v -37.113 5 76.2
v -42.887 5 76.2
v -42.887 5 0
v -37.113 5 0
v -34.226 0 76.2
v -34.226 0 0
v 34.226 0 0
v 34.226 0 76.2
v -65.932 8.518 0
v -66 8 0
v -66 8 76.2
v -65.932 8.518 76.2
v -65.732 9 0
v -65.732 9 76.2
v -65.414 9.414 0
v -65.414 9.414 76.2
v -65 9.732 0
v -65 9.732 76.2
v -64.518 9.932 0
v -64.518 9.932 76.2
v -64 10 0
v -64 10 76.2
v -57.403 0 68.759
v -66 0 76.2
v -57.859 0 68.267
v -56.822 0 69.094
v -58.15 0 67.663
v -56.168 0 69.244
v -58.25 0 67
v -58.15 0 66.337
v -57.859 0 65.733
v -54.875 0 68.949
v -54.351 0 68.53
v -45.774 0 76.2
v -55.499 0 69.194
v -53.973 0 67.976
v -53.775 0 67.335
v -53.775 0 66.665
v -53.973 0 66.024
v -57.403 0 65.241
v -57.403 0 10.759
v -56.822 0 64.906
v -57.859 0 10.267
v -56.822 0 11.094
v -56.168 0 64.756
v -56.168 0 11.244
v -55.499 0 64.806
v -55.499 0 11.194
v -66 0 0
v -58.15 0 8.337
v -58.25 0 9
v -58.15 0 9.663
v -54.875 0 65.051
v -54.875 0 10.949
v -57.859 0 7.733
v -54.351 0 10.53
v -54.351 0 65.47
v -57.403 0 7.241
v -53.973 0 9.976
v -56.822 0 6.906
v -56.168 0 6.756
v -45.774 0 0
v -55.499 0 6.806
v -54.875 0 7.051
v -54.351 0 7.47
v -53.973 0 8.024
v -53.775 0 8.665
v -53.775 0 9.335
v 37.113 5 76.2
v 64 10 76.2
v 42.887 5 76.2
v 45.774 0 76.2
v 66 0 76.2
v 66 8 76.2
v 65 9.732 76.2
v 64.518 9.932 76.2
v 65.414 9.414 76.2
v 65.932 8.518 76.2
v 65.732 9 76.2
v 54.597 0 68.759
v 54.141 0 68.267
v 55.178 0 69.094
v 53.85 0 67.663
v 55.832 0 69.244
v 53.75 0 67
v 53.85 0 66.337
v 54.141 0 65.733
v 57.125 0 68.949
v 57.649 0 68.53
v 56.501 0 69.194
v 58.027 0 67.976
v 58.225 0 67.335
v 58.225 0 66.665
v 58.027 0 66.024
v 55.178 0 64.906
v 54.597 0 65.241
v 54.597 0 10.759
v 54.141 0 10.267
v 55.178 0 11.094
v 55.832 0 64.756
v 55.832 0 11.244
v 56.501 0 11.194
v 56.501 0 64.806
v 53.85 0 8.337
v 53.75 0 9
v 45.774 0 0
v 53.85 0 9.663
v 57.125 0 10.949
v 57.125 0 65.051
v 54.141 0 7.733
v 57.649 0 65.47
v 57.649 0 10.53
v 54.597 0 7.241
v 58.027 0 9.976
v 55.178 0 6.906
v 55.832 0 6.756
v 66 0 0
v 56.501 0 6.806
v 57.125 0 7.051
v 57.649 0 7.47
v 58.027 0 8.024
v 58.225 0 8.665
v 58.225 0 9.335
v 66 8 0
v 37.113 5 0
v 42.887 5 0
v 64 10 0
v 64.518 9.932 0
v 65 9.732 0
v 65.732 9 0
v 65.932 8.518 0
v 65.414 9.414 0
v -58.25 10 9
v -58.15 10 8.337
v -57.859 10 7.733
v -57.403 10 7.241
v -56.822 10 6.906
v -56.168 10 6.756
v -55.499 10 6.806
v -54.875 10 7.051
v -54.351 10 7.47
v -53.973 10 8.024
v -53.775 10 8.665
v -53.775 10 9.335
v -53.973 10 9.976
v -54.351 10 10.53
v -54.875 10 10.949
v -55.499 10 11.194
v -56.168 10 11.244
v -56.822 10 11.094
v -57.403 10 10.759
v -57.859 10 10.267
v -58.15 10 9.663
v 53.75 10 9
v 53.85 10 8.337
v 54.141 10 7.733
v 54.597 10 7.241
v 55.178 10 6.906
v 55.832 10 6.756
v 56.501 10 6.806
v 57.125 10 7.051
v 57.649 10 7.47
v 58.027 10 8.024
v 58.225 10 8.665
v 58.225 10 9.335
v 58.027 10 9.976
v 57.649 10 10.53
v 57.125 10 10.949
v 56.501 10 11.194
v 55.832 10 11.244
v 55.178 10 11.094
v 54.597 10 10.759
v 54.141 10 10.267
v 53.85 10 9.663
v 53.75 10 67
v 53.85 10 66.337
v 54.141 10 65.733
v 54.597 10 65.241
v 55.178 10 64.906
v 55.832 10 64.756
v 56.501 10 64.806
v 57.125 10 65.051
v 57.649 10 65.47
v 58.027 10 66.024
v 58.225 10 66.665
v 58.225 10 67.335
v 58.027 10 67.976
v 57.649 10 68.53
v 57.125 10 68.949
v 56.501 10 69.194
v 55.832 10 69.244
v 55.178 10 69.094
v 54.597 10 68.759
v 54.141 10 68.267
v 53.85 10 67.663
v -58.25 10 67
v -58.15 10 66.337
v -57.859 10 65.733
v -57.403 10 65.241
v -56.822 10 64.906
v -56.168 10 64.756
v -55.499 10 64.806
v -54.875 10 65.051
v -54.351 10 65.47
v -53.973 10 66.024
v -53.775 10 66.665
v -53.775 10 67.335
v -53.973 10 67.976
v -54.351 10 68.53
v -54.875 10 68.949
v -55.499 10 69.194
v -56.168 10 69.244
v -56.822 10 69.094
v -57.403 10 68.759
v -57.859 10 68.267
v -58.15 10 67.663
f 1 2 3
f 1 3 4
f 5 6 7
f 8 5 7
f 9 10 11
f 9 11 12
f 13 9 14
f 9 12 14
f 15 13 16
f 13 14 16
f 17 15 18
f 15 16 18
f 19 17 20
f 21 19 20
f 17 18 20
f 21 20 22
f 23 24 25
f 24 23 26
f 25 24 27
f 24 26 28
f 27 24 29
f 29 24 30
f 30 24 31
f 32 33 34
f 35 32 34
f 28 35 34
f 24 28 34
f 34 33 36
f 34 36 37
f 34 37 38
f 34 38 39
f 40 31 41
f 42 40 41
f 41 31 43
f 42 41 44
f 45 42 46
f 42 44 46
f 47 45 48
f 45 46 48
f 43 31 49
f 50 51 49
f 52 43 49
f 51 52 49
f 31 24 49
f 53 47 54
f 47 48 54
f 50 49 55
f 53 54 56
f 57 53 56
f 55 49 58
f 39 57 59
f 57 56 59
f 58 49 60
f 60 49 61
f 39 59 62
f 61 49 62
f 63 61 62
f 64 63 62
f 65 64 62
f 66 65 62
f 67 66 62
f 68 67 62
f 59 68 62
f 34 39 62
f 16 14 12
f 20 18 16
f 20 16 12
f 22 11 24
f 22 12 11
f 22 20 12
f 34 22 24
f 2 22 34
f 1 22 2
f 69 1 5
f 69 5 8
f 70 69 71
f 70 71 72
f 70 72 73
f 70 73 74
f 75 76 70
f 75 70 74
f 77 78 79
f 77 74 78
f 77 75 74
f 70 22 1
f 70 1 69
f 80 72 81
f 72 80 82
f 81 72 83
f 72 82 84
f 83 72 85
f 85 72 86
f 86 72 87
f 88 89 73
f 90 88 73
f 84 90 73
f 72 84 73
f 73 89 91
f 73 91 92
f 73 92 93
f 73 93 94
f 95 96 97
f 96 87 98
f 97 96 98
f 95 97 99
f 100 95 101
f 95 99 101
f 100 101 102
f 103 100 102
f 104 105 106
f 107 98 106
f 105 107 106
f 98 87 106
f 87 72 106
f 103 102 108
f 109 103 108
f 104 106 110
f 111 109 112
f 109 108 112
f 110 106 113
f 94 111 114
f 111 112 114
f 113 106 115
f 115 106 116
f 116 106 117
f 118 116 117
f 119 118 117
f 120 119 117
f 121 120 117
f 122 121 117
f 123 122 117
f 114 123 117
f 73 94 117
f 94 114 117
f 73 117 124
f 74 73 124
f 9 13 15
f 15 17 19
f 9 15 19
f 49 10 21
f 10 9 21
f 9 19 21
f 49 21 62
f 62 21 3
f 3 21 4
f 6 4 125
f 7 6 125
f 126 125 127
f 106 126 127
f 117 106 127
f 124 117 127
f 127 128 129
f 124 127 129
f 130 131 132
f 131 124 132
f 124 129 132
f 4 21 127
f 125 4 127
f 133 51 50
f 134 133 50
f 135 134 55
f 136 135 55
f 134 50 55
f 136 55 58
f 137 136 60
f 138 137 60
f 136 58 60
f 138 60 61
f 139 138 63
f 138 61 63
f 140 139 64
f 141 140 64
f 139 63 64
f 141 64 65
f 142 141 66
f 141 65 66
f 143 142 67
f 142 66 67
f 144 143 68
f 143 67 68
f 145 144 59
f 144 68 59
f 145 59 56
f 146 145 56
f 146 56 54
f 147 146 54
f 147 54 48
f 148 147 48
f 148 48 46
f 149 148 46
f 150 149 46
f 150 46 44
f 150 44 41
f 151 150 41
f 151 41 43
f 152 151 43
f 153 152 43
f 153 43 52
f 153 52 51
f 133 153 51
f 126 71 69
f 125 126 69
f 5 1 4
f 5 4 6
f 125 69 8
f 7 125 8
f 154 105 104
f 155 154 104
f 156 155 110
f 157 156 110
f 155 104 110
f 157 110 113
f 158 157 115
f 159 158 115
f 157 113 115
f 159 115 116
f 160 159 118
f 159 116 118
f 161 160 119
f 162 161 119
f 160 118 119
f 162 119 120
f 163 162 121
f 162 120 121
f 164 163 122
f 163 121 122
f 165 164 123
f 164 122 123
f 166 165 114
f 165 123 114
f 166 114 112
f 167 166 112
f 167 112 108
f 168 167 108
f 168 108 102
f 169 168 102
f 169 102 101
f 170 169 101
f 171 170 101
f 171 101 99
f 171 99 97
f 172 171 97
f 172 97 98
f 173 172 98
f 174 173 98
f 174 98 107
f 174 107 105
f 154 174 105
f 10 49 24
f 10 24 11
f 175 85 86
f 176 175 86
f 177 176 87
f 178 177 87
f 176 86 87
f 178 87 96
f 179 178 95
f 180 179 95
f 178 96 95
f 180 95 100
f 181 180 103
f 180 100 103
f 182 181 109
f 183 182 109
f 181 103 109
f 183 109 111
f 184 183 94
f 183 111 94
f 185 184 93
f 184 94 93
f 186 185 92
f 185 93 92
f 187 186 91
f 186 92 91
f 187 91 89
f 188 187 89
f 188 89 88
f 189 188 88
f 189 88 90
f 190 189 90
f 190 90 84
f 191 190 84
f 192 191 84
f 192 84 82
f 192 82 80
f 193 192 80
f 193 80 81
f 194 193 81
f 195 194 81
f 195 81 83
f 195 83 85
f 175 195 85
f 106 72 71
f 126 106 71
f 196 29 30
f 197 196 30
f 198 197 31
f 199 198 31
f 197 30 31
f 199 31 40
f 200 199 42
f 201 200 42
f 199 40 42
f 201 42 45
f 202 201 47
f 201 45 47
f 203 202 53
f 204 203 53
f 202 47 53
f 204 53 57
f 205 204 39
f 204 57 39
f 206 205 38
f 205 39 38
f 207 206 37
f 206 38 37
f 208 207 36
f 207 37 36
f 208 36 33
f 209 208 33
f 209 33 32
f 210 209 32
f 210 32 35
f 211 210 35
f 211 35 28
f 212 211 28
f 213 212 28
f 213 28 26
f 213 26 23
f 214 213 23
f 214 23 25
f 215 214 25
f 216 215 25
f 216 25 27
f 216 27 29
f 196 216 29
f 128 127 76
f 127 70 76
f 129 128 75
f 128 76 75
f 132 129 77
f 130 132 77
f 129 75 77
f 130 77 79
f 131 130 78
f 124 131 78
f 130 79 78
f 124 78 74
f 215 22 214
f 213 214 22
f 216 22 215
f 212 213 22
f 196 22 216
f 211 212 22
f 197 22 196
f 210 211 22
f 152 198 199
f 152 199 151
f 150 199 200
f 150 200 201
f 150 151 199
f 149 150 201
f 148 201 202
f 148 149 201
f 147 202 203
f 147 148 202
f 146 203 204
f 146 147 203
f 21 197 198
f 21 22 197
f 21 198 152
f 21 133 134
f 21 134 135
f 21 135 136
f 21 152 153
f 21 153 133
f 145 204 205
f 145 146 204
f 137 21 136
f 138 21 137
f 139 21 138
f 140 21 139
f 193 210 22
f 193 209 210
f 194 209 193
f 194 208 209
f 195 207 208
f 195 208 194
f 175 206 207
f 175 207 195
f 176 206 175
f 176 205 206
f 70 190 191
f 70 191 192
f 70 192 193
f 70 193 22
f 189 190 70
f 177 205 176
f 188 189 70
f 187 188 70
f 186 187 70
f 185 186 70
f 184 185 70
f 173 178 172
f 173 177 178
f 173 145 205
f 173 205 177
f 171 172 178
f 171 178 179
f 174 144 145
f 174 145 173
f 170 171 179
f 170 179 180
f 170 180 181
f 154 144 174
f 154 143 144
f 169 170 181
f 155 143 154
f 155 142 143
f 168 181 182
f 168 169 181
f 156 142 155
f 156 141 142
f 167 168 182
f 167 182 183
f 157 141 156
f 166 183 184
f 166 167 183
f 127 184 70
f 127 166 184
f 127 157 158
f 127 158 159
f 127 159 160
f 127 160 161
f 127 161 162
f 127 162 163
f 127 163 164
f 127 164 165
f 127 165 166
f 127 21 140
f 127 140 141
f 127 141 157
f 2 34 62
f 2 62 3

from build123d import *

# Parameters (mm, degrees)
SKETCH1_W            = 132
SKETCH1_H            = 10
BOSS_EXTRUDE1_DEPTH  = 76.2
CUT_EXTRUDE1_DEPTH   = 76.2
FILLET2_R            = 2
M4_CLEARANCE_HOLE1_D = 4.5


with BuildPart() as part:
    # Sketch1 → Boss-Extrude1 (new body)
    with BuildSketch(Plane.XY):
        with Locations((0, 5)):
            Rectangle(SKETCH1_W, SKETCH1_H)
    extrude(amount=BOSS_EXTRUDE1_DEPTH)

    # Sketch2 → Cut-Extrude1 (cut)
    with BuildSketch(Plane.XY.offset(76.2)):
        Polygon((34.226497308, 0), (37.113248654, -5), (42.886751346, -5), (45.773502692, 0), (42.886751346, 5), (37.113248654, 5), align=None)
        Polygon((-37.113248654, 5), (-34.226497308, 0), (-37.113248654, -5), (-42.886751346, -5), (-45.773502692, 0), (-42.886751346, 5), align=None)
    extrude(amount=-CUT_EXTRUDE1_DEPTH, mode=Mode.SUBTRACT)

    # Fillet2
    fillet2_edges = [part.edges().sort_by_distance(p)[0] for p in [
        (66, 10, 38.1),
        (-66, 10, 38.1),
    ]]
    fillet(fillet2_edges, radius=FILLET2_R)

    # M4 Clearance Hole1 (through all)
    with Locations(Plane(origin=(0, 10, 0), x_dir=(1, 0, 0), z_dir=(0, 1, 0))):
        with Locations((-56, -67), (-56, -9), (56, -9), (56, -67)):
            Hole(M4_CLEARANCE_HOLE1_D / 2)


solid = part.part
